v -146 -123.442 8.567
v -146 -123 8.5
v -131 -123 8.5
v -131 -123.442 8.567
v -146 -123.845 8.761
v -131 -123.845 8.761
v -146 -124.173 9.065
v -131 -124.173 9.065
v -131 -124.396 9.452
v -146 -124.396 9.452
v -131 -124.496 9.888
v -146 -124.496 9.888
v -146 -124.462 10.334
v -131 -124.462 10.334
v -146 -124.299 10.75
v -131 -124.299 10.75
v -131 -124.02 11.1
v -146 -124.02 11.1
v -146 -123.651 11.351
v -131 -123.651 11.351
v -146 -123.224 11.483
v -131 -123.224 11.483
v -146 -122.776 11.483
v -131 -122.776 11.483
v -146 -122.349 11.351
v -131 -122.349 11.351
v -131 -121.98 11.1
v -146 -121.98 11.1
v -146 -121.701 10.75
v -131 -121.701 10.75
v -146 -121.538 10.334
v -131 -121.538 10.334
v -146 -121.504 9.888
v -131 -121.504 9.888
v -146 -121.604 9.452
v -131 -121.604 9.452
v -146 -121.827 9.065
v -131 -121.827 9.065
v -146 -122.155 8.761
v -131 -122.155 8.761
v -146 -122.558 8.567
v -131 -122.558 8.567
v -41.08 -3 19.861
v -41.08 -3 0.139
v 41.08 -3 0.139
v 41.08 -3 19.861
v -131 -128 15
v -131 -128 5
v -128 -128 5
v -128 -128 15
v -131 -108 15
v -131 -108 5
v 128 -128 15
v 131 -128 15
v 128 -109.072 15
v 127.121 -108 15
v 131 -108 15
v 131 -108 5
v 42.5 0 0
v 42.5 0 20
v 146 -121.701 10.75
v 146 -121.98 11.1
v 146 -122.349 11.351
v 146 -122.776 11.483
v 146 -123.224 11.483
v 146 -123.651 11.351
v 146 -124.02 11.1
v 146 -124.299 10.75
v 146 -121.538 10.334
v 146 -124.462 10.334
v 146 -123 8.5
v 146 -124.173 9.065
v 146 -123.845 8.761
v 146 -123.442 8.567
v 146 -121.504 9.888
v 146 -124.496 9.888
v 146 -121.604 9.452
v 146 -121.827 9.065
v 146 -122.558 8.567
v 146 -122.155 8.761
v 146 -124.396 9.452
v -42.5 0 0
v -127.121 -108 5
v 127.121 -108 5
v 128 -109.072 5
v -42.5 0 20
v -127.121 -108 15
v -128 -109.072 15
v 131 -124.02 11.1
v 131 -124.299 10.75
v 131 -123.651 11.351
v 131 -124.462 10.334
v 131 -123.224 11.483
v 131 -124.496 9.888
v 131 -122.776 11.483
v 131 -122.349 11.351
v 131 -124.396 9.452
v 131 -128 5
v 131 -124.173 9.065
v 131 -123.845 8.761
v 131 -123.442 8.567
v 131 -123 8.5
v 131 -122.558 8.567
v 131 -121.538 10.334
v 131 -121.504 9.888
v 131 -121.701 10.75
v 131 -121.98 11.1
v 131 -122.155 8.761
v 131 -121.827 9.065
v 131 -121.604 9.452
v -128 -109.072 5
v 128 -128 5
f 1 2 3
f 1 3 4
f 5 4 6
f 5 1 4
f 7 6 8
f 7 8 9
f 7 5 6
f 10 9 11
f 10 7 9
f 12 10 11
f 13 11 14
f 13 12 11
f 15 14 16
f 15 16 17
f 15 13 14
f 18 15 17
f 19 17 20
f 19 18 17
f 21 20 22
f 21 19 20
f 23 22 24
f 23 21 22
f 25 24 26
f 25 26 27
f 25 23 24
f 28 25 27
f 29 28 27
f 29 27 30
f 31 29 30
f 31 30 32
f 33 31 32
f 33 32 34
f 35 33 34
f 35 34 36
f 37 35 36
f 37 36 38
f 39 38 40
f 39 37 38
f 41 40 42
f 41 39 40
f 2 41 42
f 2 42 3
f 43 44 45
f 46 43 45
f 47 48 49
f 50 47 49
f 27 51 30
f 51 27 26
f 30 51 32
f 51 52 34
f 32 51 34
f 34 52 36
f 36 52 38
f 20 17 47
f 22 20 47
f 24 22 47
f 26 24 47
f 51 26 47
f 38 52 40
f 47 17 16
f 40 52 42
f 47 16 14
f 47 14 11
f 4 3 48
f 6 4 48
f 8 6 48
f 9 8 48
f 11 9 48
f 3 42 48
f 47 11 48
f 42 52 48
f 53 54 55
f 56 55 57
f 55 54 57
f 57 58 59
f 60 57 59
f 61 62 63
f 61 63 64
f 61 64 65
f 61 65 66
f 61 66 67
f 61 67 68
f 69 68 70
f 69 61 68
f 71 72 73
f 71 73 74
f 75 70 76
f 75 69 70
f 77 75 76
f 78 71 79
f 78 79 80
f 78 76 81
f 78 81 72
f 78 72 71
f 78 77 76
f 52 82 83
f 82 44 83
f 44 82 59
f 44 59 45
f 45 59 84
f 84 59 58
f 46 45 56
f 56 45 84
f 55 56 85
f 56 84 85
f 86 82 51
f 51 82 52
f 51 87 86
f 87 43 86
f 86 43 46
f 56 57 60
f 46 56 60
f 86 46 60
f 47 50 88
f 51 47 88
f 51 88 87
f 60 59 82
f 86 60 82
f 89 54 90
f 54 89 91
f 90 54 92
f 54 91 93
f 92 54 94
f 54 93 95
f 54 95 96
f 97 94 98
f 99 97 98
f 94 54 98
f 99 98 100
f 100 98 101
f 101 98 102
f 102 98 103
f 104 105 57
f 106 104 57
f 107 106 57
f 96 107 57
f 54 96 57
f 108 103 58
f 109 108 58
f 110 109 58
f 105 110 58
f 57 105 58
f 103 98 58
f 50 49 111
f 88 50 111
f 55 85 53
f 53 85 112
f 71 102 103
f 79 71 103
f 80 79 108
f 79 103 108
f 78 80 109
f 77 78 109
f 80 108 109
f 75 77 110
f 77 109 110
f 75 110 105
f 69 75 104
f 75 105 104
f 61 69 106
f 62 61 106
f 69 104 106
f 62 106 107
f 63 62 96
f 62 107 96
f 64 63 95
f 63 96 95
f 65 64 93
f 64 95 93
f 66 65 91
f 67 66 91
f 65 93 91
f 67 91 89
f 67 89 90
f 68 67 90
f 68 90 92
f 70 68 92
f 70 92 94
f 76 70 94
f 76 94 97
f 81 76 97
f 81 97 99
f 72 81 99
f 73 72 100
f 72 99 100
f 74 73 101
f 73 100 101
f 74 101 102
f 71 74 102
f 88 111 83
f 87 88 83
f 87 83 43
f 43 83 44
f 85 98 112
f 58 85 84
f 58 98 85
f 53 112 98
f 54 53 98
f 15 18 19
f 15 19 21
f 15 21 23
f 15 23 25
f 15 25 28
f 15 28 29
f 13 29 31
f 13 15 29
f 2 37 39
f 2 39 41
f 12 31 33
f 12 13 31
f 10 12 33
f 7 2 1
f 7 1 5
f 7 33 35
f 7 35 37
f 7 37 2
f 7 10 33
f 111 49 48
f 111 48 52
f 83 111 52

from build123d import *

# Parameters (mm, degrees)
BOSS_EXTRUDE1_DEPTH = 20
SKETCH6_W           = 5
SKETCH6_H           = 20
CUT_EXTRUDE1_DEPTH  = 293.280687012
SKETCH7_R           = 1.5
BOSS_EXTRUDE2_DEPTH = 15
BOSS_EXTRUDE3_START = 15
SKETCH8_R           = 1.5
BOSS_EXTRUDE3_DEPTH = 15


with BuildPart() as part:
    # Sketch5 → Boss-Extrude1 (new body)
    with BuildSketch(Plane.XY):
        Polygon((0, 0), (-42.5, 0), (-131, -108), (-131, -128), (-128, -128), (-128, -109.072168564), (-41.07975076, -3), (0, -3), align=None)
        Polygon((42.5, 0), (0, 0), (0, -3), (41.07975076, -3), (128, -109.072168564), (128, -128), (131, -128), (131, -108), align=None)
    extrude(amount=BOSS_EXTRUDE1_DEPTH)

    # Sketch6 → Cut-Extrude1 (cut, through all)
    with BuildSketch(Plane(origin=(131, 0, 0), x_dir=(0, 0, -1), z_dir=(1, 0, 0))):
        with Locations((-17.5, -118)):
            Rectangle(SKETCH6_W, SKETCH6_H)
        Polygon((-20, -108), (-15, -108), (-20, 0), align=None)
        Polygon((0, 0), (-5, -108), (0, -108), align=None)
        with Locations((-2.5, -118)):
            Rectangle(SKETCH6_W, SKETCH6_H)
    extrude(amount=-CUT_EXTRUDE1_DEPTH, mode=Mode.SUBTRACT)

    # Sketch7 → Boss-Extrude2 (add)
    with BuildSketch(Plane(origin=(131, 0, 0), x_dir=(0, 0, -1), z_dir=(1, 0, 0))):
        with Locations((-10, -123)):
            Circle(SKETCH7_R)
    extrude(amount=BOSS_EXTRUDE2_DEPTH)

    # Sketch8 → Boss-Extrude3 (add)
    with BuildSketch(Plane.ZY.offset(131).offset(BOSS_EXTRUDE3_START)):
        with Locations(Location((10, -123, 0), (0, 0, 180))):
            Circle(SKETCH8_R)
    extrude(amount=-BOSS_EXTRUDE3_DEPTH)


solid = part.part
